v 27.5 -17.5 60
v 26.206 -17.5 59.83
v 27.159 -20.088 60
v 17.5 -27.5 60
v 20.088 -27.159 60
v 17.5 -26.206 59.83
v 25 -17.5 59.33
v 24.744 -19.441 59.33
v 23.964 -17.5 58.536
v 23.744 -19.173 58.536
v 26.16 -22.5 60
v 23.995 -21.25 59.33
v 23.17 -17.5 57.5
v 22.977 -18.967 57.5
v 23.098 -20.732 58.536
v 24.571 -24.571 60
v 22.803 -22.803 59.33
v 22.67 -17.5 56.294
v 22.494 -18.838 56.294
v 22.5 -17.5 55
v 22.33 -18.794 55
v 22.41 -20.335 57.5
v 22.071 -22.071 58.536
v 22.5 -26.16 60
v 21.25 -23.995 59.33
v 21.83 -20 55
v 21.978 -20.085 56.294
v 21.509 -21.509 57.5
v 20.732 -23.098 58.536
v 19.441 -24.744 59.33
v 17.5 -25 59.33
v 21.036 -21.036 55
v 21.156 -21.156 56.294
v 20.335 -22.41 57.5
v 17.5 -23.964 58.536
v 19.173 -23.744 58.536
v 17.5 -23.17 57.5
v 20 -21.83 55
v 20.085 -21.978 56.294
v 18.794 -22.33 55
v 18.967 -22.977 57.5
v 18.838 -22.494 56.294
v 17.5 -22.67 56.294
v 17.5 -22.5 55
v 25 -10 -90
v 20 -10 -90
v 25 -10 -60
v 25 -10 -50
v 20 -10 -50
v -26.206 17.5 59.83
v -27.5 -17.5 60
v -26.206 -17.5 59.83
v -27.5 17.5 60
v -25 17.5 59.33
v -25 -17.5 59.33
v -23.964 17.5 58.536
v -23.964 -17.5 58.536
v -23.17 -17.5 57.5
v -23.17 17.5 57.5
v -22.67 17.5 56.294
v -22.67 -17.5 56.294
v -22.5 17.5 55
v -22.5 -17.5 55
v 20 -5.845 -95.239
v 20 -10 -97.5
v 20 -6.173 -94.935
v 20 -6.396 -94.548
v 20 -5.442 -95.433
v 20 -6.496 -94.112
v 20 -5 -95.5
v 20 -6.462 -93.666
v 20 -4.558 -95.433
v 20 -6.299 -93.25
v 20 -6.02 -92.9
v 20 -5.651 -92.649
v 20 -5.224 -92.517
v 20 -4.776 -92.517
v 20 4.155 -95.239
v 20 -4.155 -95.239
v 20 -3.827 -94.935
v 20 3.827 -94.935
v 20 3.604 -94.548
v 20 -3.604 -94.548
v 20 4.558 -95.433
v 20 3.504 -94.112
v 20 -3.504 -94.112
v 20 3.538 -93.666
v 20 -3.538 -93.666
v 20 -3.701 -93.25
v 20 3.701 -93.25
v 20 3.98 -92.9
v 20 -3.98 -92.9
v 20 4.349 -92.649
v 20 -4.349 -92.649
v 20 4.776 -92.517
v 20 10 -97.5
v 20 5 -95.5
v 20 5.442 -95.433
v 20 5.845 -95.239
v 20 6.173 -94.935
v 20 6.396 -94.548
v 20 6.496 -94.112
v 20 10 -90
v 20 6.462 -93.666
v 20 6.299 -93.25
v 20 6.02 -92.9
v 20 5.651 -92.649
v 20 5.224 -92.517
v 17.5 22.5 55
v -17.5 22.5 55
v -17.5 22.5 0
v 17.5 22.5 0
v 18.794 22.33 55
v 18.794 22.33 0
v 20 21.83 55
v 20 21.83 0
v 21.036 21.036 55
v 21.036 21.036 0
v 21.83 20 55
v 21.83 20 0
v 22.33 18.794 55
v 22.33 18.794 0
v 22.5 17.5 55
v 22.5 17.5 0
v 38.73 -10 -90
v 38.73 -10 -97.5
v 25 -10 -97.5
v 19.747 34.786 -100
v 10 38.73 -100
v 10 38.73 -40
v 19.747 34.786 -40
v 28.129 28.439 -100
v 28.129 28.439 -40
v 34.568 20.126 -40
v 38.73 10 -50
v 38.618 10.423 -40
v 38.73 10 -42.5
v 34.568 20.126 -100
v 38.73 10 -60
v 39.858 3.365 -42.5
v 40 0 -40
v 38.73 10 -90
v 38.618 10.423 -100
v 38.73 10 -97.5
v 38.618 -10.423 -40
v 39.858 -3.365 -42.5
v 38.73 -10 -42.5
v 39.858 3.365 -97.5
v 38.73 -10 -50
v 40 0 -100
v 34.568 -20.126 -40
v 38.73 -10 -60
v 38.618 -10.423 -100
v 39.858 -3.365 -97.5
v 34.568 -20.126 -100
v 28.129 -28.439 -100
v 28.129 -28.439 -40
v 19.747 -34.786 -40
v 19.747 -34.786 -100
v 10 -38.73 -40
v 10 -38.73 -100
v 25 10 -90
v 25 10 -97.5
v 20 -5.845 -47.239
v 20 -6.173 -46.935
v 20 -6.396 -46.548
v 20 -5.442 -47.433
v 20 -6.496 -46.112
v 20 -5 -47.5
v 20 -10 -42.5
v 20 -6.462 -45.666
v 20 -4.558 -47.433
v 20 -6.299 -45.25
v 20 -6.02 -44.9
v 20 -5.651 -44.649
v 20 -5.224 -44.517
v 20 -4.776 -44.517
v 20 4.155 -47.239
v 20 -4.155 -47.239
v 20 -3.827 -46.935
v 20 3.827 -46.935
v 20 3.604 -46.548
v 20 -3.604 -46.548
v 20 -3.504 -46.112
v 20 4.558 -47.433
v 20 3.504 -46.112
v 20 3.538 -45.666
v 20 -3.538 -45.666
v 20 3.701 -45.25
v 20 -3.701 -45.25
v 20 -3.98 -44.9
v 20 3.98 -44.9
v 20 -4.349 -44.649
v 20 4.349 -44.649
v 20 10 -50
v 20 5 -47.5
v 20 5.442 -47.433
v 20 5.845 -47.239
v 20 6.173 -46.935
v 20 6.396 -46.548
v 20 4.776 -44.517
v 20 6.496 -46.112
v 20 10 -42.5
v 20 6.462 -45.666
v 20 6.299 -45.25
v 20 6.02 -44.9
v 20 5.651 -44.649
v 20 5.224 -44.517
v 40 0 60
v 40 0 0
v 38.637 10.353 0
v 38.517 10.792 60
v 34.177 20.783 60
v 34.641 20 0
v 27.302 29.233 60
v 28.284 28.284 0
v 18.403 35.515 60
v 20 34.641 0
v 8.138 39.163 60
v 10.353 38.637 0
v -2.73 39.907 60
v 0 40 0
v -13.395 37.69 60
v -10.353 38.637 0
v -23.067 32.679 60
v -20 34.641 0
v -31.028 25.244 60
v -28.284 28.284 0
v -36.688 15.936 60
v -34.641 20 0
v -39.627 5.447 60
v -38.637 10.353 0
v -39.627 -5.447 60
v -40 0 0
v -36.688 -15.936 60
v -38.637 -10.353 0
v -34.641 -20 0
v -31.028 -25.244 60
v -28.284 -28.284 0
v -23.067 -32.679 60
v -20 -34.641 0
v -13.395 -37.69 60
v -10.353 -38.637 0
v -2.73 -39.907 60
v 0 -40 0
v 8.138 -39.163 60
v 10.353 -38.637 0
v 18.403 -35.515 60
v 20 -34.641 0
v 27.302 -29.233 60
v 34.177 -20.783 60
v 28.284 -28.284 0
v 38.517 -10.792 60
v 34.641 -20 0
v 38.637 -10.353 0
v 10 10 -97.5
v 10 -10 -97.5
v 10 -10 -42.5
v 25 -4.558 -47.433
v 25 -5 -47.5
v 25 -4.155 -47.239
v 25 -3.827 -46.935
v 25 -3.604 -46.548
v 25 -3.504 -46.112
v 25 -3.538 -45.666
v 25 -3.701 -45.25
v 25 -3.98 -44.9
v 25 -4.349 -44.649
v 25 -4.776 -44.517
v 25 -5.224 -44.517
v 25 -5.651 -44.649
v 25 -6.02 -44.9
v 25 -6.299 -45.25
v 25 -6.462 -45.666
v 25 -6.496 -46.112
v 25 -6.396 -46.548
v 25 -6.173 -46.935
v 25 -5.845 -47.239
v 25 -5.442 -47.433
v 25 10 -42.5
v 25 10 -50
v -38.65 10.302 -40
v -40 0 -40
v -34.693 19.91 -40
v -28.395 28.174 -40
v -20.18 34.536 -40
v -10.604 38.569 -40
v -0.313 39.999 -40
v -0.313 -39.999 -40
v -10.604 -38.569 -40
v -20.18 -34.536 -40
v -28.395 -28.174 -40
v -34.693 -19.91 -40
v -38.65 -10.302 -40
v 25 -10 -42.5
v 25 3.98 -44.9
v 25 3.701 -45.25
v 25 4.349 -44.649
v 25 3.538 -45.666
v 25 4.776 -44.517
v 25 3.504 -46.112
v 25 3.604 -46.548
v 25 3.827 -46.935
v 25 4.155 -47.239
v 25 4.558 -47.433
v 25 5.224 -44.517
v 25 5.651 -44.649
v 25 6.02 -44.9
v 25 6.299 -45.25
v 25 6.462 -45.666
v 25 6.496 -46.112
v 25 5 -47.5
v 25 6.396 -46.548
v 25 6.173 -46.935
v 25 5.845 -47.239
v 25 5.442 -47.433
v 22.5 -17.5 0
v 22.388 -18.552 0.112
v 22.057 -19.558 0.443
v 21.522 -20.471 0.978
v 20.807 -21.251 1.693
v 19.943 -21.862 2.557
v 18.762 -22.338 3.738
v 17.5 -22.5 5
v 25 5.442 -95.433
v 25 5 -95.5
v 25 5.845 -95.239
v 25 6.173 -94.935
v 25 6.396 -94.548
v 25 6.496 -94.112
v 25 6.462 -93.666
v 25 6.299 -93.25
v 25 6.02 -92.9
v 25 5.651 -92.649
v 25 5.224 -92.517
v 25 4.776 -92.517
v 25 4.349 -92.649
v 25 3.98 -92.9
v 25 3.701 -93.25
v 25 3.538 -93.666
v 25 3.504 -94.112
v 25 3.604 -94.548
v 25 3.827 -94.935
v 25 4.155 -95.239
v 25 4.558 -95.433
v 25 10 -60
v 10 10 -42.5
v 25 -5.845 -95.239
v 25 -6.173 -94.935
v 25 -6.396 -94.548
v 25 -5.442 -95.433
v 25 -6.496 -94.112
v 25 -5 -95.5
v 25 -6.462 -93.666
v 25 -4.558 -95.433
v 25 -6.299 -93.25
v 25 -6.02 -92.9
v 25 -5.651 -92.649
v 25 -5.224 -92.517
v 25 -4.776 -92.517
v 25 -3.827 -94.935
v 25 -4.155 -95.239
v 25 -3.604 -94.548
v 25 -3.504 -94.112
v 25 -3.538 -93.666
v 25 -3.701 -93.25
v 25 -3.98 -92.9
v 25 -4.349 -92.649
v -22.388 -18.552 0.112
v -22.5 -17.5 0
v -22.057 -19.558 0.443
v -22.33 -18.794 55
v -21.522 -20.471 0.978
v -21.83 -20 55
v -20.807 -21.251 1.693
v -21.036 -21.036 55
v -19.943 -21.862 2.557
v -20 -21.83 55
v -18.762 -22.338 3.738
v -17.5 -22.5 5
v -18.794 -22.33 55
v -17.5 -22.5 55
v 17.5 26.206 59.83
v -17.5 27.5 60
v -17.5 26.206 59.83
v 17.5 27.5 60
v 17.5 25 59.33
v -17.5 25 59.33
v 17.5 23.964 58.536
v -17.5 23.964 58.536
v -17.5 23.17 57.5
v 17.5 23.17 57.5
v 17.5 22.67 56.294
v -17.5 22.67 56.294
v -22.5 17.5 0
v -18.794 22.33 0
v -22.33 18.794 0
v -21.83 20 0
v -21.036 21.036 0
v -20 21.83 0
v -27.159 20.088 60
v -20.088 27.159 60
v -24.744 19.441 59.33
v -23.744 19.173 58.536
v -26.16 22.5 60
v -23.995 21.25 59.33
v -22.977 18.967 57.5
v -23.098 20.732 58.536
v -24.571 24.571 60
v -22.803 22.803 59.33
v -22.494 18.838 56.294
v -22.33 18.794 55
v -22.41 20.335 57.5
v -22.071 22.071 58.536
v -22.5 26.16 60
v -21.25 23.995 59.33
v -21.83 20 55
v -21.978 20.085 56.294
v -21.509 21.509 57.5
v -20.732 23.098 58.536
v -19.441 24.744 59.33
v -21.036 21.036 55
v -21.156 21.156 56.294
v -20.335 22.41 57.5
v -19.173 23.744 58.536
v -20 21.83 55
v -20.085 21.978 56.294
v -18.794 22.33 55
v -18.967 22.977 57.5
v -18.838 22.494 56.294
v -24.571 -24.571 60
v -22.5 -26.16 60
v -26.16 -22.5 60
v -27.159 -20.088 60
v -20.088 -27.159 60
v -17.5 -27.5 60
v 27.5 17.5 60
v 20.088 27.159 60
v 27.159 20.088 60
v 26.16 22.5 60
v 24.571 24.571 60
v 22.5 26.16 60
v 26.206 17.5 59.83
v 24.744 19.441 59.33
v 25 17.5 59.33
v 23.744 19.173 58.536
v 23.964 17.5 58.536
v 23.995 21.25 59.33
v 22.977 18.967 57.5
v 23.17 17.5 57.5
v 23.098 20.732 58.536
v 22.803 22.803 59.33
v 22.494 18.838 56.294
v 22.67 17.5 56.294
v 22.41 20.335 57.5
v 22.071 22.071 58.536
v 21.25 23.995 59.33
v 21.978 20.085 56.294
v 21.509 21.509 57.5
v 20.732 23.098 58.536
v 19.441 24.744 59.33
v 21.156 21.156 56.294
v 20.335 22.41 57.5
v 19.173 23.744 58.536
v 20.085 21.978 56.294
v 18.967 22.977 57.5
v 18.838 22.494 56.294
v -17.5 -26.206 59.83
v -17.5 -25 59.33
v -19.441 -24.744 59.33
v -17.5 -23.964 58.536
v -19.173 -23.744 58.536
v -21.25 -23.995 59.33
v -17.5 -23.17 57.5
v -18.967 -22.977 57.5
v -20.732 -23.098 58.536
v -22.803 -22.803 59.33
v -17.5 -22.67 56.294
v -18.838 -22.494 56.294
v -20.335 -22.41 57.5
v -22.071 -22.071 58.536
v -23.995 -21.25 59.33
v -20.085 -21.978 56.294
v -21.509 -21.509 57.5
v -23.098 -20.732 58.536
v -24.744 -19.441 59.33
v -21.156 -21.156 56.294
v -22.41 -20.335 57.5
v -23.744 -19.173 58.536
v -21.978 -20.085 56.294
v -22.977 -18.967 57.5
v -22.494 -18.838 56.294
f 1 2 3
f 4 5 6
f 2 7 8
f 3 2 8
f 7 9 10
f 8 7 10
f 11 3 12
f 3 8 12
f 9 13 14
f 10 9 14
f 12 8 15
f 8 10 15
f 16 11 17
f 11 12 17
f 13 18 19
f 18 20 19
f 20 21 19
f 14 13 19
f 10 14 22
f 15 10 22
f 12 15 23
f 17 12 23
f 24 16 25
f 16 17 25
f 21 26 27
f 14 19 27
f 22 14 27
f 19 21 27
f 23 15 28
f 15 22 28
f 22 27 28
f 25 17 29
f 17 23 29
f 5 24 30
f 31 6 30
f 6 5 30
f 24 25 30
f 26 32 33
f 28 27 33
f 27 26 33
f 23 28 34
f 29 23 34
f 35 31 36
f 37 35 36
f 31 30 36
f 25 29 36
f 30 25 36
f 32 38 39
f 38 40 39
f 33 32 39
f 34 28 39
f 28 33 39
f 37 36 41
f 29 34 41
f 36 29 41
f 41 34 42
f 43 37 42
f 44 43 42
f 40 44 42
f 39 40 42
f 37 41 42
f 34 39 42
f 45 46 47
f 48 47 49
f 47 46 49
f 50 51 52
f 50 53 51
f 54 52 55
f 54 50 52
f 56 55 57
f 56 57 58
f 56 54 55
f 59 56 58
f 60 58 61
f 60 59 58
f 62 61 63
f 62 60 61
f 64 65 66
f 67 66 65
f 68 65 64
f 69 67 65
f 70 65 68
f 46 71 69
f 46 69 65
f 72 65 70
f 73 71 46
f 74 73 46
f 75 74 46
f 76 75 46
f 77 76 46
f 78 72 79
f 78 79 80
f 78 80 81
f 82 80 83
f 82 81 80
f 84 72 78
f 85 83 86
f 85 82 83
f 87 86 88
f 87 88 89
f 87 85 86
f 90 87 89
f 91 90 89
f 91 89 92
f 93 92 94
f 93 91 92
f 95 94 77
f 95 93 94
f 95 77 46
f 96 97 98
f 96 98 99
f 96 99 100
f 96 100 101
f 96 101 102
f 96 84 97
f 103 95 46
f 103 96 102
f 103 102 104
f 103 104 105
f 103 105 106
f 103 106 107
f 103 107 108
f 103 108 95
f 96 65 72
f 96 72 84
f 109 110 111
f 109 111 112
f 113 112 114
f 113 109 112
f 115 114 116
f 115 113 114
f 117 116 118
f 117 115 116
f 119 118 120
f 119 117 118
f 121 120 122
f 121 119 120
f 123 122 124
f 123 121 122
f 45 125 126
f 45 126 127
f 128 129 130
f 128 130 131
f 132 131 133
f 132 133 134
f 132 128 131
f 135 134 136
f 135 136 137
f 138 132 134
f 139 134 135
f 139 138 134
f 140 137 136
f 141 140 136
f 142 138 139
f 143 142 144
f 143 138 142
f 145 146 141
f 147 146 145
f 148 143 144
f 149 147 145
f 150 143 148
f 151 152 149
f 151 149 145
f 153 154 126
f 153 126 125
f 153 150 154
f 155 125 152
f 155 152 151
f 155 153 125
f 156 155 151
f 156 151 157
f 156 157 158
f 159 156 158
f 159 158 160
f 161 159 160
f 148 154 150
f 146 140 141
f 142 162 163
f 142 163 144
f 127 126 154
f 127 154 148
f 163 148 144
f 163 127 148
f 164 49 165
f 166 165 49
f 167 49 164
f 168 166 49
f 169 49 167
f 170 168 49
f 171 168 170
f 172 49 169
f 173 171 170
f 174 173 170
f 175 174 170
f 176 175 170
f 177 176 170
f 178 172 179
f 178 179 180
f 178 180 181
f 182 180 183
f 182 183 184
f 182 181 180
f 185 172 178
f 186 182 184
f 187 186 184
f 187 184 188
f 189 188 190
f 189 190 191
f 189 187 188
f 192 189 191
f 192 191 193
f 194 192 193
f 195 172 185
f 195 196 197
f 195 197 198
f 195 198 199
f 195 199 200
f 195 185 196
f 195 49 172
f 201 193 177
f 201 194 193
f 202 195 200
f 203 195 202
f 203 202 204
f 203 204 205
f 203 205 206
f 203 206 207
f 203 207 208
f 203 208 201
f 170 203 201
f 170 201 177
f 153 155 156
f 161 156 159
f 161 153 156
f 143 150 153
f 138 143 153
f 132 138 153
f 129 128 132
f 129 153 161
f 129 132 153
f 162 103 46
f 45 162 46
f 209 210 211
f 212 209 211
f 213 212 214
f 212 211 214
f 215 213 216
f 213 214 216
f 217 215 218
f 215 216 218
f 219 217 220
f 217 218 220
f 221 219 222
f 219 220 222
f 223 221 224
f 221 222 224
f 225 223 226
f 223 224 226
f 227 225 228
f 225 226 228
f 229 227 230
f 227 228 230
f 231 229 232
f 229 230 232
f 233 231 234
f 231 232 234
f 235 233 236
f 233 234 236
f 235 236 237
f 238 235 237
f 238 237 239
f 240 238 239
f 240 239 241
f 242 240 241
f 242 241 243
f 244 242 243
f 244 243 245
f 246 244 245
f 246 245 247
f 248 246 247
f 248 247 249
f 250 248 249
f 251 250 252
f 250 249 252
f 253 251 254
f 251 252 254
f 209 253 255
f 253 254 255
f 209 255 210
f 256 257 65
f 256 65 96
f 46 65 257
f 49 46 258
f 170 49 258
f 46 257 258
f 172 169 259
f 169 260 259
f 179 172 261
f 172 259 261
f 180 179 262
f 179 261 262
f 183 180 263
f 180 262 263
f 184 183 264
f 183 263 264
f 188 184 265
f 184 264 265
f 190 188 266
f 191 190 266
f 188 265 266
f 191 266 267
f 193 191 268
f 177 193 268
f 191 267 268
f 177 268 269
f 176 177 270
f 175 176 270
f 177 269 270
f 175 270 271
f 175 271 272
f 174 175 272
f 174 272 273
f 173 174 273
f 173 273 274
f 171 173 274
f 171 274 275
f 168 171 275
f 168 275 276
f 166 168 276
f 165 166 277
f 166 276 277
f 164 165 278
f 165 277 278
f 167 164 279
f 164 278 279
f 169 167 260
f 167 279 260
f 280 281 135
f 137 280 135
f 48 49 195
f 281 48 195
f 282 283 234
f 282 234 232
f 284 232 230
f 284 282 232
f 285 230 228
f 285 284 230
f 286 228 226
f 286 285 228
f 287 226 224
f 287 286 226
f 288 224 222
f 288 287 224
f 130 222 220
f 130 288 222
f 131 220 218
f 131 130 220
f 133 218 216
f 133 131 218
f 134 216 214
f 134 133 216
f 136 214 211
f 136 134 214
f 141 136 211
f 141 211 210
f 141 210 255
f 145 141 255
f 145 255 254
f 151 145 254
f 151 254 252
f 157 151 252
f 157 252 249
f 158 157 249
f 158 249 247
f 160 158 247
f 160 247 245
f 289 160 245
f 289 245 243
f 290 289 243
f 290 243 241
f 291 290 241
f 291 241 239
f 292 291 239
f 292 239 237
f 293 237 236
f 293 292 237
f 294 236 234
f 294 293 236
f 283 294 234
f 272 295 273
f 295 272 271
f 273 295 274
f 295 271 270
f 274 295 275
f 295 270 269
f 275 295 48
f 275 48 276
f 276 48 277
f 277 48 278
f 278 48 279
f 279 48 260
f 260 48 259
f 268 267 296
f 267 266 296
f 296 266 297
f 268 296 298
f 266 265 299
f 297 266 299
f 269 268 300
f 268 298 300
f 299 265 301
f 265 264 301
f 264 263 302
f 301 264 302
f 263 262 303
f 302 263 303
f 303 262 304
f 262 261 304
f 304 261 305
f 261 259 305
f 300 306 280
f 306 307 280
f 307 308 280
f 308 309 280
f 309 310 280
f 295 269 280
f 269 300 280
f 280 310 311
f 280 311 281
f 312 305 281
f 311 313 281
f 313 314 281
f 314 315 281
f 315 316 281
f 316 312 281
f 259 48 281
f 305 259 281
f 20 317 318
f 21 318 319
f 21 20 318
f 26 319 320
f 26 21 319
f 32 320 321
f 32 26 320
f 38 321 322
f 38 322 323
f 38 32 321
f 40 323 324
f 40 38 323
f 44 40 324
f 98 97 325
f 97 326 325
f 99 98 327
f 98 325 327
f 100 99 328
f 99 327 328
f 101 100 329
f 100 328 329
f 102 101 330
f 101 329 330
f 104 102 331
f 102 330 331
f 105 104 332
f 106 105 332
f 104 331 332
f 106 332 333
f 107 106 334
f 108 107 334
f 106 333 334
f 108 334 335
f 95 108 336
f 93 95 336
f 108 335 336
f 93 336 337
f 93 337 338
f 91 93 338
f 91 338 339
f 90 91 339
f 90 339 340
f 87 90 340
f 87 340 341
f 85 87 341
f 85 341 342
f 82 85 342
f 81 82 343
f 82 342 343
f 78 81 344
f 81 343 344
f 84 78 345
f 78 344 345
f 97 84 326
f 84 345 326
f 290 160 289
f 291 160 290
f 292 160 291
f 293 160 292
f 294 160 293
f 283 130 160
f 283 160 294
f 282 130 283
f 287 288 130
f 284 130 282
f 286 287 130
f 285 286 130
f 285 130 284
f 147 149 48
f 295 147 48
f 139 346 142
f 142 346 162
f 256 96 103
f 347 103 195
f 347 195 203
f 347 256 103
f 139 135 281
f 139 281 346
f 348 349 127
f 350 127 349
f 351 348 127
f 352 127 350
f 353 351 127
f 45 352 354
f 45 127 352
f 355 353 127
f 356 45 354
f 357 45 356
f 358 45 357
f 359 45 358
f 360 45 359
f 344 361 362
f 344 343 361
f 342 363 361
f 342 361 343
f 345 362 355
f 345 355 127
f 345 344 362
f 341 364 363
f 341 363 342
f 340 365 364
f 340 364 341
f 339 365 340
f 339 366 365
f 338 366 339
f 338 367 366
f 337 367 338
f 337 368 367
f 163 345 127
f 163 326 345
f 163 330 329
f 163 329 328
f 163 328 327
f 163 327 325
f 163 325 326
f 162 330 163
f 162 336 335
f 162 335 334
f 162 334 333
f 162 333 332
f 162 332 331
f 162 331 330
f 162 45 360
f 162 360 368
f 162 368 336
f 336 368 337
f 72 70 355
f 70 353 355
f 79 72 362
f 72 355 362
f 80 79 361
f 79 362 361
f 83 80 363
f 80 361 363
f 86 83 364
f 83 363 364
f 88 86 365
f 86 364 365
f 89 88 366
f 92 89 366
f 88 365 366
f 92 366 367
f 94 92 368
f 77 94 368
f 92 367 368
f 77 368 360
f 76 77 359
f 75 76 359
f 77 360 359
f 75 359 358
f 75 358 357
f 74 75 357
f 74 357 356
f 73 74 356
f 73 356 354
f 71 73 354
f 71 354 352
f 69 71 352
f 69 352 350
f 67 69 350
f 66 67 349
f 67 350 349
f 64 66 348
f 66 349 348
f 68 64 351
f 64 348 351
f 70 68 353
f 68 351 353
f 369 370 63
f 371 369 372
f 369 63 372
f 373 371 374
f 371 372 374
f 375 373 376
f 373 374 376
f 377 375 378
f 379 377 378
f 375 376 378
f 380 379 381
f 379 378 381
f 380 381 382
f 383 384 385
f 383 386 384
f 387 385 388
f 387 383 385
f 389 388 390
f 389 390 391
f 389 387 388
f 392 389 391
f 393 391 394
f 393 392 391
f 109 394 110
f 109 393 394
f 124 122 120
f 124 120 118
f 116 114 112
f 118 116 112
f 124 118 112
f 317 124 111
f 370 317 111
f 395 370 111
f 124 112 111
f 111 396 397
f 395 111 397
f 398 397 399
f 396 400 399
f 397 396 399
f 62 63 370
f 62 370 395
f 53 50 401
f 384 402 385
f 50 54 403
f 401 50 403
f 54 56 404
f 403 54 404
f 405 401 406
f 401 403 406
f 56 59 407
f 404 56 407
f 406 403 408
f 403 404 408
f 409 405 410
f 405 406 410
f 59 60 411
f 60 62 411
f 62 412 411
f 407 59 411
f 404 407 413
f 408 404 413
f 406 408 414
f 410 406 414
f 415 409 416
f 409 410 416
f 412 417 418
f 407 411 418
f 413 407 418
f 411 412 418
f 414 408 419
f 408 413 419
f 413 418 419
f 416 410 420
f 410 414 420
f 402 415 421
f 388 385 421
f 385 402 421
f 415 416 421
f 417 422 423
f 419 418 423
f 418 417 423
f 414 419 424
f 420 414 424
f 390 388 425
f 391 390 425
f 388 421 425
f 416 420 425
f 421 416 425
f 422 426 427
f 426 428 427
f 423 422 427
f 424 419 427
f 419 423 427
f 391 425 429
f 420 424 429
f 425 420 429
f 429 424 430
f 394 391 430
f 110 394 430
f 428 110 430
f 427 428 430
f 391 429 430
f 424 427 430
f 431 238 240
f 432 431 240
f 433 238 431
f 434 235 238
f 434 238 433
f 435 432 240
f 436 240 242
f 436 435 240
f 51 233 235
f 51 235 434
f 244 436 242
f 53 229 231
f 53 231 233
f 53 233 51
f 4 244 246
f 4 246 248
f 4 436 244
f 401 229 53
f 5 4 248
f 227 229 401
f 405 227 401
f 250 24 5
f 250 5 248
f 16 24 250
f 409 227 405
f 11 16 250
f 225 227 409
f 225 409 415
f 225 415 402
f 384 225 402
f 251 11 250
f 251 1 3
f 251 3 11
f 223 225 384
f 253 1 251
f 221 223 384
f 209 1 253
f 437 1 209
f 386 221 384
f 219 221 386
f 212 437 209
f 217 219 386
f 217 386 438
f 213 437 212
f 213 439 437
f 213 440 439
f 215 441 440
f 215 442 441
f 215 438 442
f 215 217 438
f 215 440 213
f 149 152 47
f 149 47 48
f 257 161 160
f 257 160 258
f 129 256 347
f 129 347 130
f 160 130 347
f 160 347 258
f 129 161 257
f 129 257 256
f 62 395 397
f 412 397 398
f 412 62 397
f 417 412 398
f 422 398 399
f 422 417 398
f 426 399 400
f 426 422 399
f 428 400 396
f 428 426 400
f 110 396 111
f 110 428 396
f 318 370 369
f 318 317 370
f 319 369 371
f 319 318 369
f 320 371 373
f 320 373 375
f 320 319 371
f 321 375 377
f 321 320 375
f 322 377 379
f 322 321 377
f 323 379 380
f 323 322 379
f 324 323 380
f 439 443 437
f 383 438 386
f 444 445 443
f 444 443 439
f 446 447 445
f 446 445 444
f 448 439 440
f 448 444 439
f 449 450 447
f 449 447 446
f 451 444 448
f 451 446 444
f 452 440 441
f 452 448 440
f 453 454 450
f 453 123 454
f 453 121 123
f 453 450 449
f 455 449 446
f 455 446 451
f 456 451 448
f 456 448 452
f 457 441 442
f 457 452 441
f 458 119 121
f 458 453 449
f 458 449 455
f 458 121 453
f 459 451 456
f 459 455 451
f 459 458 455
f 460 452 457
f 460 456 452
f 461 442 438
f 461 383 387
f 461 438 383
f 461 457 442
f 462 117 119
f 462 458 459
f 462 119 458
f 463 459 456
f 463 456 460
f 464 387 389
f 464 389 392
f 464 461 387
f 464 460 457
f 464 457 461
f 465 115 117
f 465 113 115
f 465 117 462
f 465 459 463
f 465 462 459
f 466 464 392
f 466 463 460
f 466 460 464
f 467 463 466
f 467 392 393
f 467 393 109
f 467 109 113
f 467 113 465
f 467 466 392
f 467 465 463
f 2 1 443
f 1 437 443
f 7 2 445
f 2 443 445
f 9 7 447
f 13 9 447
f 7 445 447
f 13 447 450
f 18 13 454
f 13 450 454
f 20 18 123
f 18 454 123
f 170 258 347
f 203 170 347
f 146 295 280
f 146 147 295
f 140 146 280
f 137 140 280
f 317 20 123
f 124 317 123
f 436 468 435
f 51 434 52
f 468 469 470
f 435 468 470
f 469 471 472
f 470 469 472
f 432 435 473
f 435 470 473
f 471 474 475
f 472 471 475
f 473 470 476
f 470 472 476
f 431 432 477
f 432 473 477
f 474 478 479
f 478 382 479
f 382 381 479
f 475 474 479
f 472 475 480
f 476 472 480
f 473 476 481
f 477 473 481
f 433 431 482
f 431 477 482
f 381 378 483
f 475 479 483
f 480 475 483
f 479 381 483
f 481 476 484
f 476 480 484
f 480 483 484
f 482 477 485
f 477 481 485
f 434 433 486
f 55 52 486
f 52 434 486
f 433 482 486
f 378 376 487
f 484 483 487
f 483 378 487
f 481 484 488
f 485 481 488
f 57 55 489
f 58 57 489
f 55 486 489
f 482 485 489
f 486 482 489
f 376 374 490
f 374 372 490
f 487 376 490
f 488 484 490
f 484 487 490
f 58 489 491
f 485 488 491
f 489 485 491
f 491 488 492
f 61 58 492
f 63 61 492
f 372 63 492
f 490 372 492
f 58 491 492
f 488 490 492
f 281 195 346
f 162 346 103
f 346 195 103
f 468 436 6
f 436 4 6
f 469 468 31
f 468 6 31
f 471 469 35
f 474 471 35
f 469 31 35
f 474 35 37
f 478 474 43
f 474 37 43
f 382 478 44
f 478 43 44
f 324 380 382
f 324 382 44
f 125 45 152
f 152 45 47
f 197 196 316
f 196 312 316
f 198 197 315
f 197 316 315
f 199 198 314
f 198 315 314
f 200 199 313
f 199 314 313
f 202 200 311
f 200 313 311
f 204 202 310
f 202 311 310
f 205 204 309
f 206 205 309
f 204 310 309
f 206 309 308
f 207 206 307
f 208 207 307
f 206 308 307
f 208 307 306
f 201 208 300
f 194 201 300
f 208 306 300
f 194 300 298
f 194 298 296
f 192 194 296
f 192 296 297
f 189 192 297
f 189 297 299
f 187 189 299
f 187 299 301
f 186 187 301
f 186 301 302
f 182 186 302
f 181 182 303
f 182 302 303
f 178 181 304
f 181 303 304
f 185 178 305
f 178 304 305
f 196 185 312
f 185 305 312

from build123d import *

# Parameters (mm, degrees)
SKETCH1_R                      = 40
SKETCH1_W                      = 45
SKETCH1_H                      = 45
BOSS_EXTRUDE1_DEPTH            = 60
BOSS_EXTRUDE2_START            = 40
SKETCH2_R                      = 40
BOSS_EXTRUDE2_DEPTH            = 40
BOSS_EXTRUDE3_START            = 60
BOSS_EXTRUDE3_DEPTH            = 60
FILLET1_R                      = 5
SKETCH7_W                      = 55
SKETCH7_H                      = 20
CUT_EXTRUDE4_DEPTH             = 10
CUT_EXTRUDE5_DEPTH             = 29
F_3_0MM_DOWEL_HOLE2_D          = 3
F_3_0MM_DOWEL_HOLE2_DEPTH      = 5
F_3_0MM_DOWEL_HOLE2_TIP        = 0.901290929
CUT_EXTRUDE6_REACH             = 134.665
SKETCH18_W                     = 16.006168542
SKETCH18_H                     = 20
CUT_EXTRUDE6_DIRECTION_2_REACH = 134.665


with BuildPart() as part:
    # Sketch1 → Boss-Extrude1 (new body)
    with BuildSketch(Plane.XY):
        Circle(SKETCH1_R)
        Rectangle(SKETCH1_W, SKETCH1_H, mode=Mode.SUBTRACT)
    extrude(amount=BOSS_EXTRUDE1_DEPTH)

    # Sketch2 → Boss-Extrude2 (add)
    with BuildSketch(Plane(origin=(0, 0, 0), x_dir=(-1, 0, 0), z_dir=(0, 0, -1)).offset(BOSS_EXTRUDE2_START)):
        Circle(SKETCH2_R)
    extrude(amount=-BOSS_EXTRUDE2_DEPTH)

    # Sketch3 → Boss-Extrude3 (add)
    with BuildSketch(Plane(origin=(0, 0, -40), x_dir=(-1, 0, 0), z_dir=(0, 0, -1)).offset(BOSS_EXTRUDE3_START)):
        with BuildLine():
            Line((-10, -38.729833462), (-10, 38.729833462))
            ThreePointArc((-10, 38.729833462), (-40, 0), (-10, -38.729833462))
        make_face()
    extrude(amount=-BOSS_EXTRUDE3_DEPTH)

    # Fillet1
    fillet1_edges = [part.edges().sort_by_distance(p)[0] for p in [
        (0, 22.5, 60),
        (22.5, 0, 60),
        (-22.5, 0, 60),
        (22.5, -22.5, 30),
        (0, -22.5, 60),
        (-22.5, -22.5, 30),
        (0, -22.5, 0),
        (-22.5, 22.5, 30),
        (22.5, 22.5, 30),
    ]]
    fillet(fillet1_edges, radius=FILLET1_R)

    # Sketch7 → Cut-Extrude4 (cut)
    with BuildSketch(Plane.ZY.offset(-10)):
        with Locations((-70, 0)):
            Rectangle(SKETCH7_W, SKETCH7_H)
    extrude(amount=-CUT_EXTRUDE4_DEPTH, mode=Mode.SUBTRACT)

    # Sketch8 → Cut-Extrude5 (cut)
    with BuildSketch(Plane.ZY.offset(-20)):
        Polygon((-50, 10), (-90, 10), (-90, 0), (-90, -10), (-50, -10), (-50, 0), align=None)
    extrude(amount=-CUT_EXTRUDE5_DEPTH, mode=Mode.SUBTRACT)

    # Ø3.0mm Dowel Hole2
    with Locations(Plane.ZY.offset(-20)):
        with Locations((-46, 5), (-94, 5), (-94, -5), (-46, -5)):
            Hole(F_3_0MM_DOWEL_HOLE2_D / 2, depth=F_3_0MM_DOWEL_HOLE2_DEPTH)
            with Locations((0, 0, -(F_3_0MM_DOWEL_HOLE2_DEPTH + F_3_0MM_DOWEL_HOLE2_TIP / 2))):  # 118° drill point
                Cone(0, F_3_0MM_DOWEL_HOLE2_D / 2, F_3_0MM_DOWEL_HOLE2_TIP, mode=Mode.SUBTRACT)

    # Cut-Extrude6: up to this face of the body (flat: up to its plane)
    cut_extrude6_end = Plane(part.part.faces().sort_by_distance((15, 0, -42.5))[0])
    # Sketch18 → Cut-Extrude6 (cut, up to the picked face)
    with BuildSketch(Plane(origin=(0, 0, -60), x_dir=(-1, 0, 0), z_dir=(0, 0, -1)), mode=Mode.PRIVATE) as cut_extrude6_sk1:
        with Locations((-33.003084271, 0)):
            Rectangle(SKETCH18_W, SKETCH18_H)
    cut_extrude6_tool1 = split(extrude(cut_extrude6_sk1.sketch, amount=-CUT_EXTRUDE6_REACH, mode=Mode.PRIVATE), bisect_by=cut_extrude6_end, keep=Keep.BOTH, mode=Mode.PRIVATE)
    add(cut_extrude6_tool1.solids().sort_by(Axis((33.003084, 0, -60), (0, 0, 1)))[0], mode=Mode.SUBTRACT)

    # Cut-Extrude6 direction 2: up to this face of the body (flat: up to its plane)
    cut_extrude6_direction_2_end = Plane(part.part.faces().sort_by_distance((15, 0, -97.5))[0])
    # Sketch18 → Cut-Extrude6 direction 2 (cut, up to the picked face)
    with BuildSketch(Plane(origin=(0, 0, -60), x_dir=(-1, 0, 0), z_dir=(0, 0, -1)), mode=Mode.PRIVATE) as cut_extrude6_direction_2_sk1:
        with Locations((-33.003084271, 0)):
            Rectangle(SKETCH18_W, SKETCH18_H)
    cut_extrude6_direction_2_tool1 = split(extrude(cut_extrude6_direction_2_sk1.sketch, amount=CUT_EXTRUDE6_DIRECTION_2_REACH, mode=Mode.PRIVATE), bisect_by=cut_extrude6_direction_2_end, keep=Keep.BOTH, mode=Mode.PRIVATE)
    add(cut_extrude6_direction_2_tool1.solids().sort_by(Axis((33.003084, 0, -60), (0, 0, -1)))[0], mode=Mode.SUBTRACT)


solid = part.part
